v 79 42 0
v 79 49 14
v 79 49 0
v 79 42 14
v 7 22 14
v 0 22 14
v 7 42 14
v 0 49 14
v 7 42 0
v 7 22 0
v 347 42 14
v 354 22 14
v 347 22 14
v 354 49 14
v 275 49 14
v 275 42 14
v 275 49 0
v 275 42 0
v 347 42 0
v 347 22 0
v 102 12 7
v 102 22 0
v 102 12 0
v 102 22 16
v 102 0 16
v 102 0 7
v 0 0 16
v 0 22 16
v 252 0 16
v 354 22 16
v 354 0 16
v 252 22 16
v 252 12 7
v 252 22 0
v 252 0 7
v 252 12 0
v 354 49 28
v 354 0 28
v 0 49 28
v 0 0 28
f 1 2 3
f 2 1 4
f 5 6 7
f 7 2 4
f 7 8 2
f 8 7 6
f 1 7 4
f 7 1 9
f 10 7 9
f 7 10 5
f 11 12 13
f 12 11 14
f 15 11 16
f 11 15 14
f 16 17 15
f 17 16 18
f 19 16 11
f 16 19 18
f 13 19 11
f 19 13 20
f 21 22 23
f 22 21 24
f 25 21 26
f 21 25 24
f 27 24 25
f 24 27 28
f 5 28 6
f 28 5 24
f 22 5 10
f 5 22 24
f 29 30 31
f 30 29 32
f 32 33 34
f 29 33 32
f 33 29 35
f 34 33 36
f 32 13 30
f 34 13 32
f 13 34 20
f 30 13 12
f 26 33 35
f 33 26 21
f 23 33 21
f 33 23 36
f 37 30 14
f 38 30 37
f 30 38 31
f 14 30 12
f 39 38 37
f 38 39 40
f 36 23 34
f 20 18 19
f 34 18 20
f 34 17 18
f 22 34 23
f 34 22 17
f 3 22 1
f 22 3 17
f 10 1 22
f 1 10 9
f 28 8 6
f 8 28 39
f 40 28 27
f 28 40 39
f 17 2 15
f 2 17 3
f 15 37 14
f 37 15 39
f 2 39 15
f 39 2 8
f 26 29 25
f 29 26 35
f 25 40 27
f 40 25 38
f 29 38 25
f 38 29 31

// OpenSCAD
include <../src/wardrobe.scad>;
plank_xy_bottom(wardrobe_n);
//github_openscad -o wardrobe_3/plank_xy_bottom.stl -D wardrobe_n=3 -D cutting_edge=0 -D break_view_length=0 wardrobe_3/plank_xy_bottom_stl.scad
